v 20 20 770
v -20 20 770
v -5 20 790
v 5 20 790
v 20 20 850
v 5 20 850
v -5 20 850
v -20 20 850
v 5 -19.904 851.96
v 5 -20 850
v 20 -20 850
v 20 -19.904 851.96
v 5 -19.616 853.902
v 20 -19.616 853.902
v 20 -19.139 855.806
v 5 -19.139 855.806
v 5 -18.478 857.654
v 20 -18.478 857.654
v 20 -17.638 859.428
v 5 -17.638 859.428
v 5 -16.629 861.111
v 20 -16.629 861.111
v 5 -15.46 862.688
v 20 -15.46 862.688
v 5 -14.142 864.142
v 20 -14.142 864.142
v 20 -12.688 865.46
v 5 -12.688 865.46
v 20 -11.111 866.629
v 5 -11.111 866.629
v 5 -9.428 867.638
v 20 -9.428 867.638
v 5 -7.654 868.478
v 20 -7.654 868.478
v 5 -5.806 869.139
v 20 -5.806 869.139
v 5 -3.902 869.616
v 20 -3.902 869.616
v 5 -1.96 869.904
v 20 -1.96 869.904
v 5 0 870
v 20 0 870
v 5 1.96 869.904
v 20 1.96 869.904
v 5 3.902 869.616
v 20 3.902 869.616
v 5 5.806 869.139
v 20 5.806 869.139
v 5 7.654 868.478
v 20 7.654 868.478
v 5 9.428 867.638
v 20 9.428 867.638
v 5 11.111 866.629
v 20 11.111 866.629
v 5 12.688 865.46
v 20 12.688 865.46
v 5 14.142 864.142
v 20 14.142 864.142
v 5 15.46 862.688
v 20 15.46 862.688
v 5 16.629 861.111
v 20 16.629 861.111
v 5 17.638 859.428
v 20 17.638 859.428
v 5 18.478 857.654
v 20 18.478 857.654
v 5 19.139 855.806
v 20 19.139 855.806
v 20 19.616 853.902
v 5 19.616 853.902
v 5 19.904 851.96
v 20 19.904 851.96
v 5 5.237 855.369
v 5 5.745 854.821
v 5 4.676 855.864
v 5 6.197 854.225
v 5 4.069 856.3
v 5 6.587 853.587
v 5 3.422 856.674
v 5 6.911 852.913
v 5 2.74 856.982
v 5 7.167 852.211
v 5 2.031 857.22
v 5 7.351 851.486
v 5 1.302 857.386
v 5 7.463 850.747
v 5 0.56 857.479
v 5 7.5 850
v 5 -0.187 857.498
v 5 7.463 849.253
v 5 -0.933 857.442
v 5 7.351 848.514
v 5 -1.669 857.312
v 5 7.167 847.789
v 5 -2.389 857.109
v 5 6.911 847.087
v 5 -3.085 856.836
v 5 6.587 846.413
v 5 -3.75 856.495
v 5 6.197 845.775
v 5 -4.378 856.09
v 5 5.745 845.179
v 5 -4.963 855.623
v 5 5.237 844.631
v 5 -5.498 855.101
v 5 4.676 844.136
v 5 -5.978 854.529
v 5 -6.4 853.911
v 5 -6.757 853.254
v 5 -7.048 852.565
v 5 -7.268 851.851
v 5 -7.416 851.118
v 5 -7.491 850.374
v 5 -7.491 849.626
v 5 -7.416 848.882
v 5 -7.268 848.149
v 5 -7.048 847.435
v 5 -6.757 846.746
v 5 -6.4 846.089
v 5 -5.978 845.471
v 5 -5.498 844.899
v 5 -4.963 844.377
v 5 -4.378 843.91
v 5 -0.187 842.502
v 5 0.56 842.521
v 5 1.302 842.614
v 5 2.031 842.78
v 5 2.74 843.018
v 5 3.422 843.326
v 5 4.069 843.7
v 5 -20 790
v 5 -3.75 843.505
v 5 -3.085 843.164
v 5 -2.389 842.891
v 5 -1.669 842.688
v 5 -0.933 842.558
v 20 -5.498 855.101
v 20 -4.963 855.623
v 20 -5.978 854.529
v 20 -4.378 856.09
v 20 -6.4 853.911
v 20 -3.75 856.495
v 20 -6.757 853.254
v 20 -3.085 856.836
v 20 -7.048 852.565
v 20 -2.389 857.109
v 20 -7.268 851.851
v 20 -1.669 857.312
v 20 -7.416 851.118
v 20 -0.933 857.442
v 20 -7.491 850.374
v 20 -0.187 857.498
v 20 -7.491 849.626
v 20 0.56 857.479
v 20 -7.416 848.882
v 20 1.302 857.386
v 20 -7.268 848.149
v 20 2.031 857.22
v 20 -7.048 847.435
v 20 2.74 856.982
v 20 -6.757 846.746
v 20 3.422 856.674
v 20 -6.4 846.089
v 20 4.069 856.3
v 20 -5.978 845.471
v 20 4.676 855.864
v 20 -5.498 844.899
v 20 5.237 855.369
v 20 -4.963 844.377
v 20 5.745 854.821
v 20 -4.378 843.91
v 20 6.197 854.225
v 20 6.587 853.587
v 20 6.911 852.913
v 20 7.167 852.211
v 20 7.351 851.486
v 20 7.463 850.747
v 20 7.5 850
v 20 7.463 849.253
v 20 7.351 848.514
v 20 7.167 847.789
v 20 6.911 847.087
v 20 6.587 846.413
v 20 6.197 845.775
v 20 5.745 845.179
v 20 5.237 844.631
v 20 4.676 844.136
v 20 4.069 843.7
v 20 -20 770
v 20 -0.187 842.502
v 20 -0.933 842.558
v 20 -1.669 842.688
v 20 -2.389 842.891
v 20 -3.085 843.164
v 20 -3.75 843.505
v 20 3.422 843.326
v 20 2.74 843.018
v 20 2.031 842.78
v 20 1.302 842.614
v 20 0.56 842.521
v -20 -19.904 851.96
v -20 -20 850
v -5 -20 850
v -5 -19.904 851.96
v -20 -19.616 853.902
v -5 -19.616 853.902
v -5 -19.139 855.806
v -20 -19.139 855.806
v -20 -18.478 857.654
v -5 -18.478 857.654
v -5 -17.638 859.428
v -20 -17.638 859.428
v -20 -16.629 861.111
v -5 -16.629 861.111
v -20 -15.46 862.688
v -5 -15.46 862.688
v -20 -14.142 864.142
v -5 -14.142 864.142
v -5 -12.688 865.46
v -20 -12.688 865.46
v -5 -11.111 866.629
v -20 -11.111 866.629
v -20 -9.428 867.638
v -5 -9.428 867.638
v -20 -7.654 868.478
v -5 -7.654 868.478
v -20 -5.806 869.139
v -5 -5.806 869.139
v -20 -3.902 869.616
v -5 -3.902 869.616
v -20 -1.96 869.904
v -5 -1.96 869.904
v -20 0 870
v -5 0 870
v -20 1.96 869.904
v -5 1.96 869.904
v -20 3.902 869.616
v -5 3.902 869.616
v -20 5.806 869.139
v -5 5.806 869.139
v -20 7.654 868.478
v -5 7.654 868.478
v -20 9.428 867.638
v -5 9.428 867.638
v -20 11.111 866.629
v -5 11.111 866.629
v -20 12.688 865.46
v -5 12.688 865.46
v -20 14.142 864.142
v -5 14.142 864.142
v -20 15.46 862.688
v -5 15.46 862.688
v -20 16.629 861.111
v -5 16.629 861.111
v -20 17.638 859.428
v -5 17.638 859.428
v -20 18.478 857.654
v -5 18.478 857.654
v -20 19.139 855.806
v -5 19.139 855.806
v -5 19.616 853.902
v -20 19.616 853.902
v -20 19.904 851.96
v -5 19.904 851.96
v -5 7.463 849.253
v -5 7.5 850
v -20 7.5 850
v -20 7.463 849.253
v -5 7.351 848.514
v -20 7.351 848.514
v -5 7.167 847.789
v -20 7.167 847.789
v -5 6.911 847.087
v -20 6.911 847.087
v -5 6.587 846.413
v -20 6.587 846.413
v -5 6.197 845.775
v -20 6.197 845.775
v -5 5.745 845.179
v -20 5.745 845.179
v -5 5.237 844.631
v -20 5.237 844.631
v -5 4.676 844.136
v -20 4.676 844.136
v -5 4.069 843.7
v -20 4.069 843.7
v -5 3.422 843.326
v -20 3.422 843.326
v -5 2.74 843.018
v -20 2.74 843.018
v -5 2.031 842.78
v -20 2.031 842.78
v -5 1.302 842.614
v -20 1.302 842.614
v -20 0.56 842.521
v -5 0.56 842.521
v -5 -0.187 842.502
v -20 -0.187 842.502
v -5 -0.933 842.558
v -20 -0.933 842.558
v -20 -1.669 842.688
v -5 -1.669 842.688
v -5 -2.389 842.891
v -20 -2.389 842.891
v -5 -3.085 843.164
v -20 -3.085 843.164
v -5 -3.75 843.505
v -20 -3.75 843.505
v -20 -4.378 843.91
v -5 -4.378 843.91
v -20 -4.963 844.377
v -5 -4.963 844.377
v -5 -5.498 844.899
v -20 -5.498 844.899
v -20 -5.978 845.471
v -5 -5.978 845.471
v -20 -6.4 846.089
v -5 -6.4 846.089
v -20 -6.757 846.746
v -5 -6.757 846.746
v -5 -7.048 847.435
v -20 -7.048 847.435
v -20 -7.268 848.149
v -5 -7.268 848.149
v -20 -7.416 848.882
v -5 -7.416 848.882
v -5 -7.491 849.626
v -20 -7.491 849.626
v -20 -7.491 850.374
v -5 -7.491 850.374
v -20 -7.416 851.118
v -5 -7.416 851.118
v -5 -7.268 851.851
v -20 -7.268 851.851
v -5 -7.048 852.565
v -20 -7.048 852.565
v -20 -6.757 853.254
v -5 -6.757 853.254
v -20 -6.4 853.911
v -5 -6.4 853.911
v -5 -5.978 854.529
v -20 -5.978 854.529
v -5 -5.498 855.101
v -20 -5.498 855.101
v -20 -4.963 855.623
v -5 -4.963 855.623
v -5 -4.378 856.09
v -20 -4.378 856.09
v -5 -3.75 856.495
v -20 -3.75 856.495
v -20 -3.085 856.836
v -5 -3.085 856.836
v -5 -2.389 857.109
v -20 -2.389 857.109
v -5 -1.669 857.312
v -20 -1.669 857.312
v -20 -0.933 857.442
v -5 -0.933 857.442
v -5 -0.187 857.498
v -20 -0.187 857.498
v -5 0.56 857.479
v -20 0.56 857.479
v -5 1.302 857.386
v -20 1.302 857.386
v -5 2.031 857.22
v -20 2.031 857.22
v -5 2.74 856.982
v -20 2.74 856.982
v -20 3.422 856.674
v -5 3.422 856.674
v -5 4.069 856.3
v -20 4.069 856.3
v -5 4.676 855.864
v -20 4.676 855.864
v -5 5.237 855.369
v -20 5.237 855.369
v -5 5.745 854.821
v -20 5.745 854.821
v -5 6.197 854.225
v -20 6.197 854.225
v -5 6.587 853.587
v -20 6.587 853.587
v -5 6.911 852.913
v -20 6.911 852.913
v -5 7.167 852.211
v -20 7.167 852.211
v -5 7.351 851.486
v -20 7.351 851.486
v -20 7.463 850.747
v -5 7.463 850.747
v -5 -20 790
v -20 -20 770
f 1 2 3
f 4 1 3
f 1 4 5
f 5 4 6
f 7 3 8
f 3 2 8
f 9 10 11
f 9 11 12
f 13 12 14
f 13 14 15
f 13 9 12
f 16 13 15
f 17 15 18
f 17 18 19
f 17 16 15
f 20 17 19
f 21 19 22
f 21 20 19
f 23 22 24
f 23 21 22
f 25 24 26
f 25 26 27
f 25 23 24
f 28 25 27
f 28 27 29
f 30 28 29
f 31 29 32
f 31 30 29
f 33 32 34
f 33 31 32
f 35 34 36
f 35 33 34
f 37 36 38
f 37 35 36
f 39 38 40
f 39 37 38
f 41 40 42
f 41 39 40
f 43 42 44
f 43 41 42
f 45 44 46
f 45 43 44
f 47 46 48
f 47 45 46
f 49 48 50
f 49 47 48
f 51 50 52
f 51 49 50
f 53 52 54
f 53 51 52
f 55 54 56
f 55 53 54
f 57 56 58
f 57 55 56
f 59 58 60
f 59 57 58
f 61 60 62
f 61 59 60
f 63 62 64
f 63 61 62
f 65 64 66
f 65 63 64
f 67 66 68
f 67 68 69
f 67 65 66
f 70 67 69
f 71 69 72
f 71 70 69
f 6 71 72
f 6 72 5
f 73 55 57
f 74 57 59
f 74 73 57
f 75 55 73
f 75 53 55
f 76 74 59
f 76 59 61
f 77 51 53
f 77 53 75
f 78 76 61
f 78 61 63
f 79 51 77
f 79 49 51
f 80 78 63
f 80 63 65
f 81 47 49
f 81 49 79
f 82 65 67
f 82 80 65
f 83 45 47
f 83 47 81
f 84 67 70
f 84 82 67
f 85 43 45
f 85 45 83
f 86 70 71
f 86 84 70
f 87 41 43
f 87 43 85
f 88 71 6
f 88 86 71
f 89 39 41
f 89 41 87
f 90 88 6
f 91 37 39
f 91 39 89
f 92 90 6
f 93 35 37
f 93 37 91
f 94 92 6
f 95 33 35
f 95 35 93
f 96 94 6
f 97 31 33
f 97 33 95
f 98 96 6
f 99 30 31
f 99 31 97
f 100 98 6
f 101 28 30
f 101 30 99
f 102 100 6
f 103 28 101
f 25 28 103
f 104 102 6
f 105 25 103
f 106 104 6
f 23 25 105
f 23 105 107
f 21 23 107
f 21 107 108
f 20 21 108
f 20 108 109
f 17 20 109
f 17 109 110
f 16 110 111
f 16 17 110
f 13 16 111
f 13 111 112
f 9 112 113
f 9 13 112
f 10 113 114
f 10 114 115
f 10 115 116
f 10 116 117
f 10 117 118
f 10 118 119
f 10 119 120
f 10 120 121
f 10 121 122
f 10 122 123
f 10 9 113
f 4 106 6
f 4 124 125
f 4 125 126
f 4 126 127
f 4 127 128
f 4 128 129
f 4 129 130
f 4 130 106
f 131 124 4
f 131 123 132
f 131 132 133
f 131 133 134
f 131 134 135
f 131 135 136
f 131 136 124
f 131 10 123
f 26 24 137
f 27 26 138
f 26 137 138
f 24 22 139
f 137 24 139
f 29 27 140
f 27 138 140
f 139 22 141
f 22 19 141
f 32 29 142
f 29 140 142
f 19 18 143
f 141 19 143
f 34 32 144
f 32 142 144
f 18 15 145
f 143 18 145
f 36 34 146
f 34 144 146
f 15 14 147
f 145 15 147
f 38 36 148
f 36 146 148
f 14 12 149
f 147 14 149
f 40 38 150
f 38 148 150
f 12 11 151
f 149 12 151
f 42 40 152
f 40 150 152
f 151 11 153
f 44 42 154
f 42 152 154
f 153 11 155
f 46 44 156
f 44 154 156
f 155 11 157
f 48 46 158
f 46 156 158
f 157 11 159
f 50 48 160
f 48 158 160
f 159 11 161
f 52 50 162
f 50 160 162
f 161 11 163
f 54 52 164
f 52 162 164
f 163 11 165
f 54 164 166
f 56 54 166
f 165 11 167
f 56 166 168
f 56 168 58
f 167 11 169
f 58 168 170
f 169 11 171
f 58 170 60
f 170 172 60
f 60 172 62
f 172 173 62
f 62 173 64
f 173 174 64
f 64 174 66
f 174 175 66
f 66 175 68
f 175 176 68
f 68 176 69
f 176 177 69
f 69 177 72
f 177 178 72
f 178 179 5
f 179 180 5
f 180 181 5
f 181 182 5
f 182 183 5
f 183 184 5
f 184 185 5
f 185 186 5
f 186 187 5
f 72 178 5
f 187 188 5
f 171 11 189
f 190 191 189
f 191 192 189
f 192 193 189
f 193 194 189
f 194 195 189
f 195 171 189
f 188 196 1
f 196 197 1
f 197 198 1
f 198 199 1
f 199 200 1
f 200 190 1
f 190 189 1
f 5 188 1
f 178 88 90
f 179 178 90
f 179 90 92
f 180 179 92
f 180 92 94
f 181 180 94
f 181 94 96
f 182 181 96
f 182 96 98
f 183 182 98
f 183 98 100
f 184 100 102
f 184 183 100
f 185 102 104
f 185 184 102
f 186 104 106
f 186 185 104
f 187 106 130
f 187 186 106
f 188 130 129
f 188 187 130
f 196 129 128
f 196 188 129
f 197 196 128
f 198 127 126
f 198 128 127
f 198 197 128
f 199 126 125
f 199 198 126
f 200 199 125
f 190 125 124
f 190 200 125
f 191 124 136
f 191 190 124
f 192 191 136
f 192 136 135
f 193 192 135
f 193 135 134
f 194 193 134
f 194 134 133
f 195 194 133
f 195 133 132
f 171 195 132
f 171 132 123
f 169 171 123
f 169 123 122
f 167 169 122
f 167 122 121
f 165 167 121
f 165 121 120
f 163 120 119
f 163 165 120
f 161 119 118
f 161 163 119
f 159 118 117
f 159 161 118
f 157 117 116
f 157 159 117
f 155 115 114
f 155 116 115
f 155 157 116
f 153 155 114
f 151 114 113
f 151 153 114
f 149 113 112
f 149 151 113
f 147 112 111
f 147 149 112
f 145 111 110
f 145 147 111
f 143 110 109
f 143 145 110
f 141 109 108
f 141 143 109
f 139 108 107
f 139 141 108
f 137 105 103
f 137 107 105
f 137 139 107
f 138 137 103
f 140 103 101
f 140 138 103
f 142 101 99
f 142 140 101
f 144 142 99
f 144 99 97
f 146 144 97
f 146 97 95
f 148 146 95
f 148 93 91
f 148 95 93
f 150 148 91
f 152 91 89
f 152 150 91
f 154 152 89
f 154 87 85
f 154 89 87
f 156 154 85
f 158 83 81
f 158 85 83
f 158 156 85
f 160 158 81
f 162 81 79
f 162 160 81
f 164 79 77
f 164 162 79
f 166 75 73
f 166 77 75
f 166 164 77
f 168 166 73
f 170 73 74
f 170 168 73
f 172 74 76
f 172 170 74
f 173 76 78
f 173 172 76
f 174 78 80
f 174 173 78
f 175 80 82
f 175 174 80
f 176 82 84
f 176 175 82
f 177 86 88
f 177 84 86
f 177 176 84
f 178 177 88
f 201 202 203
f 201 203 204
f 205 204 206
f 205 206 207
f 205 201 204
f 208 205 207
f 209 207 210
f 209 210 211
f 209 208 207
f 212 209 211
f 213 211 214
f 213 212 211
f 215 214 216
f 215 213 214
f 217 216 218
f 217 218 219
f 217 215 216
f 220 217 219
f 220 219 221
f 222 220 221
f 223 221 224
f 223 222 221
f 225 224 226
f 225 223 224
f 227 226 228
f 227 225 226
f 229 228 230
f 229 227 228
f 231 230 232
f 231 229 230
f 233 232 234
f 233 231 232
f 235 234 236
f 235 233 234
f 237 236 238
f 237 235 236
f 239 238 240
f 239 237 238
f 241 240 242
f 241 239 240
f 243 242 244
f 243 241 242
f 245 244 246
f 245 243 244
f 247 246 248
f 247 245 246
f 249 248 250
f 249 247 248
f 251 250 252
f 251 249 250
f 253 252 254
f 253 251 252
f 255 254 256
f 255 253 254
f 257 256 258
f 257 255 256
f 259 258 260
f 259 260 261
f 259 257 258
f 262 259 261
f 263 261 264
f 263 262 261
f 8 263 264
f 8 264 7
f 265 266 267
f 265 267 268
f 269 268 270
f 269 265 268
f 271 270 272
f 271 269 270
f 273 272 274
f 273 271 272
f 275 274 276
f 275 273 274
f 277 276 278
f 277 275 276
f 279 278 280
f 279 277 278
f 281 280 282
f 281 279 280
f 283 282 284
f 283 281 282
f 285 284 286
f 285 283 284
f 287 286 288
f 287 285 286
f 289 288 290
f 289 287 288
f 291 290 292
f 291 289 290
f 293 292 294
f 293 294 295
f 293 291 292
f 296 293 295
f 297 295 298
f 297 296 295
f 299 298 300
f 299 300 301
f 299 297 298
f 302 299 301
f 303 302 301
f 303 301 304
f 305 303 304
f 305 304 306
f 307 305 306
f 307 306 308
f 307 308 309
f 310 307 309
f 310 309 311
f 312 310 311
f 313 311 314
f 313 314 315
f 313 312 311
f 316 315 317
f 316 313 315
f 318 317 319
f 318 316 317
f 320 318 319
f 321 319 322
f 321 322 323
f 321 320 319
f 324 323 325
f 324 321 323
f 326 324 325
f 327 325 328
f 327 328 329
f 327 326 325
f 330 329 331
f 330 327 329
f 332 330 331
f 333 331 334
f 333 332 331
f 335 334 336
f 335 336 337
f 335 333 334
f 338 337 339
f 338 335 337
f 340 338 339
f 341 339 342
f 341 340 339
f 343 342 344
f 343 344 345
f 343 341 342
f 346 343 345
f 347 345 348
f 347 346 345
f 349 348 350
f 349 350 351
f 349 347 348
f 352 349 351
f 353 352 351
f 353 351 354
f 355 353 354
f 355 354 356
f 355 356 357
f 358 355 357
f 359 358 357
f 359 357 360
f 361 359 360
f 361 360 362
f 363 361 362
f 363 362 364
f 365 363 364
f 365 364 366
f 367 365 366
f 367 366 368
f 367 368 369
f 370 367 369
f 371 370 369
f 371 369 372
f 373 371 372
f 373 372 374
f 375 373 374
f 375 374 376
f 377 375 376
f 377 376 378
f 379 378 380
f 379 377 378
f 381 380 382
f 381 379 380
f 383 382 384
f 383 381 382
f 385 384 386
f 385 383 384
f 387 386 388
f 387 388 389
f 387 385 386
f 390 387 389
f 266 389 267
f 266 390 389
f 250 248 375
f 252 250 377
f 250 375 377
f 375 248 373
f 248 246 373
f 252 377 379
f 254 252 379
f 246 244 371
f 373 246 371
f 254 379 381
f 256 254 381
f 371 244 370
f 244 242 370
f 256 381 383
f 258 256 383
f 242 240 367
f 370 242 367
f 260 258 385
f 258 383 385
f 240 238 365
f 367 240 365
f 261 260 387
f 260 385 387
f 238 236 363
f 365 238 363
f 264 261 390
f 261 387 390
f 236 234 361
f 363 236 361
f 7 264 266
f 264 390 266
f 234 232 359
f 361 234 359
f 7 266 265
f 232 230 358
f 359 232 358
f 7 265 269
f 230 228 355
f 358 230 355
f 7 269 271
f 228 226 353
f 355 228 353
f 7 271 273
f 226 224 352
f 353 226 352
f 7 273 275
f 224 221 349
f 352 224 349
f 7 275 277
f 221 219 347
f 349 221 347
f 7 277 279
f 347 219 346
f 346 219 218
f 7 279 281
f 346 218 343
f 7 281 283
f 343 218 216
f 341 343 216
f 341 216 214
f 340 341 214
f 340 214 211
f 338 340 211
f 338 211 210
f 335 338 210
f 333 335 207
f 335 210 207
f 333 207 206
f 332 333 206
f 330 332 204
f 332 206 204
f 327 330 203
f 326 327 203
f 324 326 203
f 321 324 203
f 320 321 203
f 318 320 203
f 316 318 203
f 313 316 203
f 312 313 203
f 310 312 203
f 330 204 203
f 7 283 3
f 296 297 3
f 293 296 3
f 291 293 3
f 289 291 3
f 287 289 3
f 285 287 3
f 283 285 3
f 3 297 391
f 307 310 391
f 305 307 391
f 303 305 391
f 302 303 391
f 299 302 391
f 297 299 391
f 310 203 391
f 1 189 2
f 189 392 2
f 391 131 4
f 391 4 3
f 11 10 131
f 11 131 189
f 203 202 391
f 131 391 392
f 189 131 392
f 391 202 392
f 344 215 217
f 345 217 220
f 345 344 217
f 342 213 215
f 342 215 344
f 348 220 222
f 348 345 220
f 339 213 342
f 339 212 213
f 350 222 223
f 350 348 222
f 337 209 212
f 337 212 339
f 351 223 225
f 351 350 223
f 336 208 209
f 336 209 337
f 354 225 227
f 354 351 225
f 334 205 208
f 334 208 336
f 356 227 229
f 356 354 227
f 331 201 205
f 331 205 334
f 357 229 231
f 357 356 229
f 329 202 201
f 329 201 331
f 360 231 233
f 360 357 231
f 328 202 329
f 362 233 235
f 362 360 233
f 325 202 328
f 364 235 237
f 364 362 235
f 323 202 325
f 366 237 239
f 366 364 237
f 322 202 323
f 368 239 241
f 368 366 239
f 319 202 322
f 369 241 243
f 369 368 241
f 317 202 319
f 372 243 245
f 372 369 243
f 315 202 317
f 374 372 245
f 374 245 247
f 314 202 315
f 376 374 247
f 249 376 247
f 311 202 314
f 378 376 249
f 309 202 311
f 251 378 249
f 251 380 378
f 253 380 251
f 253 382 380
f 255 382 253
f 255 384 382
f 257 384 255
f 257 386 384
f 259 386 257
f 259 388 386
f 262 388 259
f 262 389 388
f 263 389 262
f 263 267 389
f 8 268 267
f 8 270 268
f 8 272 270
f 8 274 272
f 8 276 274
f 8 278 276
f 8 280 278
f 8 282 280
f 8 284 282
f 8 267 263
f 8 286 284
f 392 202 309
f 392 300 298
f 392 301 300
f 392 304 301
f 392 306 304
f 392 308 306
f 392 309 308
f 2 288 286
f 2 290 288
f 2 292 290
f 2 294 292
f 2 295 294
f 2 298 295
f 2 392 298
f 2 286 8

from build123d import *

# Parameters (mm, degrees)
SKETCH007_W           = 10
SKETCH007_H           = 85.035517
EXTRUDE007_DEPTH      = 50
SKETCH006_R           = 7.5
EXTRUDE006_DEPTH      = 20
CLONE_PLACEMENT_ANGLE = 180


with BuildPart() as extrude007:
    # Sketch007 → Extrude007 (new body)
    with BuildSketch(Plane.XZ.offset(20)):
        with Locations((0, 17.482242)):
            Rectangle(SKETCH007_W, SKETCH007_H)
    extrude(amount=-EXTRUDE007_DEPTH)


with BuildPart() as cut003:
    # Sketch006 → Extrude006 (new body, symmetric)
    with BuildSketch(Plane.YZ):
        with BuildLine():
            ThreePointArc((-20, 9e-06), (1.3e-05, -20), (20, 3.6e-05))
            Line((20, 80), (20, 3.6e-05))
            Line((-20, 80), (20, 80))
            Line((-20, 9e-06), (-20, 80))
        make_face()
        Circle(SKETCH006_R, mode=Mode.SUBTRACT)
    extrude(amount=EXTRUDE006_DEPTH, both=True)

    # Cut002: cut Extrude007
    add(extrude007.part, mode=Mode.SUBTRACT)


with BuildPart() as cut003_1:
    # Clone placement: moved
    add(cut003.part.moved(Location((0, 0, 850))).rotate(Axis((0, 0, 850), (0, 1, 0)), CLONE_PLACEMENT_ANGLE))


solid = cut003_1.part
